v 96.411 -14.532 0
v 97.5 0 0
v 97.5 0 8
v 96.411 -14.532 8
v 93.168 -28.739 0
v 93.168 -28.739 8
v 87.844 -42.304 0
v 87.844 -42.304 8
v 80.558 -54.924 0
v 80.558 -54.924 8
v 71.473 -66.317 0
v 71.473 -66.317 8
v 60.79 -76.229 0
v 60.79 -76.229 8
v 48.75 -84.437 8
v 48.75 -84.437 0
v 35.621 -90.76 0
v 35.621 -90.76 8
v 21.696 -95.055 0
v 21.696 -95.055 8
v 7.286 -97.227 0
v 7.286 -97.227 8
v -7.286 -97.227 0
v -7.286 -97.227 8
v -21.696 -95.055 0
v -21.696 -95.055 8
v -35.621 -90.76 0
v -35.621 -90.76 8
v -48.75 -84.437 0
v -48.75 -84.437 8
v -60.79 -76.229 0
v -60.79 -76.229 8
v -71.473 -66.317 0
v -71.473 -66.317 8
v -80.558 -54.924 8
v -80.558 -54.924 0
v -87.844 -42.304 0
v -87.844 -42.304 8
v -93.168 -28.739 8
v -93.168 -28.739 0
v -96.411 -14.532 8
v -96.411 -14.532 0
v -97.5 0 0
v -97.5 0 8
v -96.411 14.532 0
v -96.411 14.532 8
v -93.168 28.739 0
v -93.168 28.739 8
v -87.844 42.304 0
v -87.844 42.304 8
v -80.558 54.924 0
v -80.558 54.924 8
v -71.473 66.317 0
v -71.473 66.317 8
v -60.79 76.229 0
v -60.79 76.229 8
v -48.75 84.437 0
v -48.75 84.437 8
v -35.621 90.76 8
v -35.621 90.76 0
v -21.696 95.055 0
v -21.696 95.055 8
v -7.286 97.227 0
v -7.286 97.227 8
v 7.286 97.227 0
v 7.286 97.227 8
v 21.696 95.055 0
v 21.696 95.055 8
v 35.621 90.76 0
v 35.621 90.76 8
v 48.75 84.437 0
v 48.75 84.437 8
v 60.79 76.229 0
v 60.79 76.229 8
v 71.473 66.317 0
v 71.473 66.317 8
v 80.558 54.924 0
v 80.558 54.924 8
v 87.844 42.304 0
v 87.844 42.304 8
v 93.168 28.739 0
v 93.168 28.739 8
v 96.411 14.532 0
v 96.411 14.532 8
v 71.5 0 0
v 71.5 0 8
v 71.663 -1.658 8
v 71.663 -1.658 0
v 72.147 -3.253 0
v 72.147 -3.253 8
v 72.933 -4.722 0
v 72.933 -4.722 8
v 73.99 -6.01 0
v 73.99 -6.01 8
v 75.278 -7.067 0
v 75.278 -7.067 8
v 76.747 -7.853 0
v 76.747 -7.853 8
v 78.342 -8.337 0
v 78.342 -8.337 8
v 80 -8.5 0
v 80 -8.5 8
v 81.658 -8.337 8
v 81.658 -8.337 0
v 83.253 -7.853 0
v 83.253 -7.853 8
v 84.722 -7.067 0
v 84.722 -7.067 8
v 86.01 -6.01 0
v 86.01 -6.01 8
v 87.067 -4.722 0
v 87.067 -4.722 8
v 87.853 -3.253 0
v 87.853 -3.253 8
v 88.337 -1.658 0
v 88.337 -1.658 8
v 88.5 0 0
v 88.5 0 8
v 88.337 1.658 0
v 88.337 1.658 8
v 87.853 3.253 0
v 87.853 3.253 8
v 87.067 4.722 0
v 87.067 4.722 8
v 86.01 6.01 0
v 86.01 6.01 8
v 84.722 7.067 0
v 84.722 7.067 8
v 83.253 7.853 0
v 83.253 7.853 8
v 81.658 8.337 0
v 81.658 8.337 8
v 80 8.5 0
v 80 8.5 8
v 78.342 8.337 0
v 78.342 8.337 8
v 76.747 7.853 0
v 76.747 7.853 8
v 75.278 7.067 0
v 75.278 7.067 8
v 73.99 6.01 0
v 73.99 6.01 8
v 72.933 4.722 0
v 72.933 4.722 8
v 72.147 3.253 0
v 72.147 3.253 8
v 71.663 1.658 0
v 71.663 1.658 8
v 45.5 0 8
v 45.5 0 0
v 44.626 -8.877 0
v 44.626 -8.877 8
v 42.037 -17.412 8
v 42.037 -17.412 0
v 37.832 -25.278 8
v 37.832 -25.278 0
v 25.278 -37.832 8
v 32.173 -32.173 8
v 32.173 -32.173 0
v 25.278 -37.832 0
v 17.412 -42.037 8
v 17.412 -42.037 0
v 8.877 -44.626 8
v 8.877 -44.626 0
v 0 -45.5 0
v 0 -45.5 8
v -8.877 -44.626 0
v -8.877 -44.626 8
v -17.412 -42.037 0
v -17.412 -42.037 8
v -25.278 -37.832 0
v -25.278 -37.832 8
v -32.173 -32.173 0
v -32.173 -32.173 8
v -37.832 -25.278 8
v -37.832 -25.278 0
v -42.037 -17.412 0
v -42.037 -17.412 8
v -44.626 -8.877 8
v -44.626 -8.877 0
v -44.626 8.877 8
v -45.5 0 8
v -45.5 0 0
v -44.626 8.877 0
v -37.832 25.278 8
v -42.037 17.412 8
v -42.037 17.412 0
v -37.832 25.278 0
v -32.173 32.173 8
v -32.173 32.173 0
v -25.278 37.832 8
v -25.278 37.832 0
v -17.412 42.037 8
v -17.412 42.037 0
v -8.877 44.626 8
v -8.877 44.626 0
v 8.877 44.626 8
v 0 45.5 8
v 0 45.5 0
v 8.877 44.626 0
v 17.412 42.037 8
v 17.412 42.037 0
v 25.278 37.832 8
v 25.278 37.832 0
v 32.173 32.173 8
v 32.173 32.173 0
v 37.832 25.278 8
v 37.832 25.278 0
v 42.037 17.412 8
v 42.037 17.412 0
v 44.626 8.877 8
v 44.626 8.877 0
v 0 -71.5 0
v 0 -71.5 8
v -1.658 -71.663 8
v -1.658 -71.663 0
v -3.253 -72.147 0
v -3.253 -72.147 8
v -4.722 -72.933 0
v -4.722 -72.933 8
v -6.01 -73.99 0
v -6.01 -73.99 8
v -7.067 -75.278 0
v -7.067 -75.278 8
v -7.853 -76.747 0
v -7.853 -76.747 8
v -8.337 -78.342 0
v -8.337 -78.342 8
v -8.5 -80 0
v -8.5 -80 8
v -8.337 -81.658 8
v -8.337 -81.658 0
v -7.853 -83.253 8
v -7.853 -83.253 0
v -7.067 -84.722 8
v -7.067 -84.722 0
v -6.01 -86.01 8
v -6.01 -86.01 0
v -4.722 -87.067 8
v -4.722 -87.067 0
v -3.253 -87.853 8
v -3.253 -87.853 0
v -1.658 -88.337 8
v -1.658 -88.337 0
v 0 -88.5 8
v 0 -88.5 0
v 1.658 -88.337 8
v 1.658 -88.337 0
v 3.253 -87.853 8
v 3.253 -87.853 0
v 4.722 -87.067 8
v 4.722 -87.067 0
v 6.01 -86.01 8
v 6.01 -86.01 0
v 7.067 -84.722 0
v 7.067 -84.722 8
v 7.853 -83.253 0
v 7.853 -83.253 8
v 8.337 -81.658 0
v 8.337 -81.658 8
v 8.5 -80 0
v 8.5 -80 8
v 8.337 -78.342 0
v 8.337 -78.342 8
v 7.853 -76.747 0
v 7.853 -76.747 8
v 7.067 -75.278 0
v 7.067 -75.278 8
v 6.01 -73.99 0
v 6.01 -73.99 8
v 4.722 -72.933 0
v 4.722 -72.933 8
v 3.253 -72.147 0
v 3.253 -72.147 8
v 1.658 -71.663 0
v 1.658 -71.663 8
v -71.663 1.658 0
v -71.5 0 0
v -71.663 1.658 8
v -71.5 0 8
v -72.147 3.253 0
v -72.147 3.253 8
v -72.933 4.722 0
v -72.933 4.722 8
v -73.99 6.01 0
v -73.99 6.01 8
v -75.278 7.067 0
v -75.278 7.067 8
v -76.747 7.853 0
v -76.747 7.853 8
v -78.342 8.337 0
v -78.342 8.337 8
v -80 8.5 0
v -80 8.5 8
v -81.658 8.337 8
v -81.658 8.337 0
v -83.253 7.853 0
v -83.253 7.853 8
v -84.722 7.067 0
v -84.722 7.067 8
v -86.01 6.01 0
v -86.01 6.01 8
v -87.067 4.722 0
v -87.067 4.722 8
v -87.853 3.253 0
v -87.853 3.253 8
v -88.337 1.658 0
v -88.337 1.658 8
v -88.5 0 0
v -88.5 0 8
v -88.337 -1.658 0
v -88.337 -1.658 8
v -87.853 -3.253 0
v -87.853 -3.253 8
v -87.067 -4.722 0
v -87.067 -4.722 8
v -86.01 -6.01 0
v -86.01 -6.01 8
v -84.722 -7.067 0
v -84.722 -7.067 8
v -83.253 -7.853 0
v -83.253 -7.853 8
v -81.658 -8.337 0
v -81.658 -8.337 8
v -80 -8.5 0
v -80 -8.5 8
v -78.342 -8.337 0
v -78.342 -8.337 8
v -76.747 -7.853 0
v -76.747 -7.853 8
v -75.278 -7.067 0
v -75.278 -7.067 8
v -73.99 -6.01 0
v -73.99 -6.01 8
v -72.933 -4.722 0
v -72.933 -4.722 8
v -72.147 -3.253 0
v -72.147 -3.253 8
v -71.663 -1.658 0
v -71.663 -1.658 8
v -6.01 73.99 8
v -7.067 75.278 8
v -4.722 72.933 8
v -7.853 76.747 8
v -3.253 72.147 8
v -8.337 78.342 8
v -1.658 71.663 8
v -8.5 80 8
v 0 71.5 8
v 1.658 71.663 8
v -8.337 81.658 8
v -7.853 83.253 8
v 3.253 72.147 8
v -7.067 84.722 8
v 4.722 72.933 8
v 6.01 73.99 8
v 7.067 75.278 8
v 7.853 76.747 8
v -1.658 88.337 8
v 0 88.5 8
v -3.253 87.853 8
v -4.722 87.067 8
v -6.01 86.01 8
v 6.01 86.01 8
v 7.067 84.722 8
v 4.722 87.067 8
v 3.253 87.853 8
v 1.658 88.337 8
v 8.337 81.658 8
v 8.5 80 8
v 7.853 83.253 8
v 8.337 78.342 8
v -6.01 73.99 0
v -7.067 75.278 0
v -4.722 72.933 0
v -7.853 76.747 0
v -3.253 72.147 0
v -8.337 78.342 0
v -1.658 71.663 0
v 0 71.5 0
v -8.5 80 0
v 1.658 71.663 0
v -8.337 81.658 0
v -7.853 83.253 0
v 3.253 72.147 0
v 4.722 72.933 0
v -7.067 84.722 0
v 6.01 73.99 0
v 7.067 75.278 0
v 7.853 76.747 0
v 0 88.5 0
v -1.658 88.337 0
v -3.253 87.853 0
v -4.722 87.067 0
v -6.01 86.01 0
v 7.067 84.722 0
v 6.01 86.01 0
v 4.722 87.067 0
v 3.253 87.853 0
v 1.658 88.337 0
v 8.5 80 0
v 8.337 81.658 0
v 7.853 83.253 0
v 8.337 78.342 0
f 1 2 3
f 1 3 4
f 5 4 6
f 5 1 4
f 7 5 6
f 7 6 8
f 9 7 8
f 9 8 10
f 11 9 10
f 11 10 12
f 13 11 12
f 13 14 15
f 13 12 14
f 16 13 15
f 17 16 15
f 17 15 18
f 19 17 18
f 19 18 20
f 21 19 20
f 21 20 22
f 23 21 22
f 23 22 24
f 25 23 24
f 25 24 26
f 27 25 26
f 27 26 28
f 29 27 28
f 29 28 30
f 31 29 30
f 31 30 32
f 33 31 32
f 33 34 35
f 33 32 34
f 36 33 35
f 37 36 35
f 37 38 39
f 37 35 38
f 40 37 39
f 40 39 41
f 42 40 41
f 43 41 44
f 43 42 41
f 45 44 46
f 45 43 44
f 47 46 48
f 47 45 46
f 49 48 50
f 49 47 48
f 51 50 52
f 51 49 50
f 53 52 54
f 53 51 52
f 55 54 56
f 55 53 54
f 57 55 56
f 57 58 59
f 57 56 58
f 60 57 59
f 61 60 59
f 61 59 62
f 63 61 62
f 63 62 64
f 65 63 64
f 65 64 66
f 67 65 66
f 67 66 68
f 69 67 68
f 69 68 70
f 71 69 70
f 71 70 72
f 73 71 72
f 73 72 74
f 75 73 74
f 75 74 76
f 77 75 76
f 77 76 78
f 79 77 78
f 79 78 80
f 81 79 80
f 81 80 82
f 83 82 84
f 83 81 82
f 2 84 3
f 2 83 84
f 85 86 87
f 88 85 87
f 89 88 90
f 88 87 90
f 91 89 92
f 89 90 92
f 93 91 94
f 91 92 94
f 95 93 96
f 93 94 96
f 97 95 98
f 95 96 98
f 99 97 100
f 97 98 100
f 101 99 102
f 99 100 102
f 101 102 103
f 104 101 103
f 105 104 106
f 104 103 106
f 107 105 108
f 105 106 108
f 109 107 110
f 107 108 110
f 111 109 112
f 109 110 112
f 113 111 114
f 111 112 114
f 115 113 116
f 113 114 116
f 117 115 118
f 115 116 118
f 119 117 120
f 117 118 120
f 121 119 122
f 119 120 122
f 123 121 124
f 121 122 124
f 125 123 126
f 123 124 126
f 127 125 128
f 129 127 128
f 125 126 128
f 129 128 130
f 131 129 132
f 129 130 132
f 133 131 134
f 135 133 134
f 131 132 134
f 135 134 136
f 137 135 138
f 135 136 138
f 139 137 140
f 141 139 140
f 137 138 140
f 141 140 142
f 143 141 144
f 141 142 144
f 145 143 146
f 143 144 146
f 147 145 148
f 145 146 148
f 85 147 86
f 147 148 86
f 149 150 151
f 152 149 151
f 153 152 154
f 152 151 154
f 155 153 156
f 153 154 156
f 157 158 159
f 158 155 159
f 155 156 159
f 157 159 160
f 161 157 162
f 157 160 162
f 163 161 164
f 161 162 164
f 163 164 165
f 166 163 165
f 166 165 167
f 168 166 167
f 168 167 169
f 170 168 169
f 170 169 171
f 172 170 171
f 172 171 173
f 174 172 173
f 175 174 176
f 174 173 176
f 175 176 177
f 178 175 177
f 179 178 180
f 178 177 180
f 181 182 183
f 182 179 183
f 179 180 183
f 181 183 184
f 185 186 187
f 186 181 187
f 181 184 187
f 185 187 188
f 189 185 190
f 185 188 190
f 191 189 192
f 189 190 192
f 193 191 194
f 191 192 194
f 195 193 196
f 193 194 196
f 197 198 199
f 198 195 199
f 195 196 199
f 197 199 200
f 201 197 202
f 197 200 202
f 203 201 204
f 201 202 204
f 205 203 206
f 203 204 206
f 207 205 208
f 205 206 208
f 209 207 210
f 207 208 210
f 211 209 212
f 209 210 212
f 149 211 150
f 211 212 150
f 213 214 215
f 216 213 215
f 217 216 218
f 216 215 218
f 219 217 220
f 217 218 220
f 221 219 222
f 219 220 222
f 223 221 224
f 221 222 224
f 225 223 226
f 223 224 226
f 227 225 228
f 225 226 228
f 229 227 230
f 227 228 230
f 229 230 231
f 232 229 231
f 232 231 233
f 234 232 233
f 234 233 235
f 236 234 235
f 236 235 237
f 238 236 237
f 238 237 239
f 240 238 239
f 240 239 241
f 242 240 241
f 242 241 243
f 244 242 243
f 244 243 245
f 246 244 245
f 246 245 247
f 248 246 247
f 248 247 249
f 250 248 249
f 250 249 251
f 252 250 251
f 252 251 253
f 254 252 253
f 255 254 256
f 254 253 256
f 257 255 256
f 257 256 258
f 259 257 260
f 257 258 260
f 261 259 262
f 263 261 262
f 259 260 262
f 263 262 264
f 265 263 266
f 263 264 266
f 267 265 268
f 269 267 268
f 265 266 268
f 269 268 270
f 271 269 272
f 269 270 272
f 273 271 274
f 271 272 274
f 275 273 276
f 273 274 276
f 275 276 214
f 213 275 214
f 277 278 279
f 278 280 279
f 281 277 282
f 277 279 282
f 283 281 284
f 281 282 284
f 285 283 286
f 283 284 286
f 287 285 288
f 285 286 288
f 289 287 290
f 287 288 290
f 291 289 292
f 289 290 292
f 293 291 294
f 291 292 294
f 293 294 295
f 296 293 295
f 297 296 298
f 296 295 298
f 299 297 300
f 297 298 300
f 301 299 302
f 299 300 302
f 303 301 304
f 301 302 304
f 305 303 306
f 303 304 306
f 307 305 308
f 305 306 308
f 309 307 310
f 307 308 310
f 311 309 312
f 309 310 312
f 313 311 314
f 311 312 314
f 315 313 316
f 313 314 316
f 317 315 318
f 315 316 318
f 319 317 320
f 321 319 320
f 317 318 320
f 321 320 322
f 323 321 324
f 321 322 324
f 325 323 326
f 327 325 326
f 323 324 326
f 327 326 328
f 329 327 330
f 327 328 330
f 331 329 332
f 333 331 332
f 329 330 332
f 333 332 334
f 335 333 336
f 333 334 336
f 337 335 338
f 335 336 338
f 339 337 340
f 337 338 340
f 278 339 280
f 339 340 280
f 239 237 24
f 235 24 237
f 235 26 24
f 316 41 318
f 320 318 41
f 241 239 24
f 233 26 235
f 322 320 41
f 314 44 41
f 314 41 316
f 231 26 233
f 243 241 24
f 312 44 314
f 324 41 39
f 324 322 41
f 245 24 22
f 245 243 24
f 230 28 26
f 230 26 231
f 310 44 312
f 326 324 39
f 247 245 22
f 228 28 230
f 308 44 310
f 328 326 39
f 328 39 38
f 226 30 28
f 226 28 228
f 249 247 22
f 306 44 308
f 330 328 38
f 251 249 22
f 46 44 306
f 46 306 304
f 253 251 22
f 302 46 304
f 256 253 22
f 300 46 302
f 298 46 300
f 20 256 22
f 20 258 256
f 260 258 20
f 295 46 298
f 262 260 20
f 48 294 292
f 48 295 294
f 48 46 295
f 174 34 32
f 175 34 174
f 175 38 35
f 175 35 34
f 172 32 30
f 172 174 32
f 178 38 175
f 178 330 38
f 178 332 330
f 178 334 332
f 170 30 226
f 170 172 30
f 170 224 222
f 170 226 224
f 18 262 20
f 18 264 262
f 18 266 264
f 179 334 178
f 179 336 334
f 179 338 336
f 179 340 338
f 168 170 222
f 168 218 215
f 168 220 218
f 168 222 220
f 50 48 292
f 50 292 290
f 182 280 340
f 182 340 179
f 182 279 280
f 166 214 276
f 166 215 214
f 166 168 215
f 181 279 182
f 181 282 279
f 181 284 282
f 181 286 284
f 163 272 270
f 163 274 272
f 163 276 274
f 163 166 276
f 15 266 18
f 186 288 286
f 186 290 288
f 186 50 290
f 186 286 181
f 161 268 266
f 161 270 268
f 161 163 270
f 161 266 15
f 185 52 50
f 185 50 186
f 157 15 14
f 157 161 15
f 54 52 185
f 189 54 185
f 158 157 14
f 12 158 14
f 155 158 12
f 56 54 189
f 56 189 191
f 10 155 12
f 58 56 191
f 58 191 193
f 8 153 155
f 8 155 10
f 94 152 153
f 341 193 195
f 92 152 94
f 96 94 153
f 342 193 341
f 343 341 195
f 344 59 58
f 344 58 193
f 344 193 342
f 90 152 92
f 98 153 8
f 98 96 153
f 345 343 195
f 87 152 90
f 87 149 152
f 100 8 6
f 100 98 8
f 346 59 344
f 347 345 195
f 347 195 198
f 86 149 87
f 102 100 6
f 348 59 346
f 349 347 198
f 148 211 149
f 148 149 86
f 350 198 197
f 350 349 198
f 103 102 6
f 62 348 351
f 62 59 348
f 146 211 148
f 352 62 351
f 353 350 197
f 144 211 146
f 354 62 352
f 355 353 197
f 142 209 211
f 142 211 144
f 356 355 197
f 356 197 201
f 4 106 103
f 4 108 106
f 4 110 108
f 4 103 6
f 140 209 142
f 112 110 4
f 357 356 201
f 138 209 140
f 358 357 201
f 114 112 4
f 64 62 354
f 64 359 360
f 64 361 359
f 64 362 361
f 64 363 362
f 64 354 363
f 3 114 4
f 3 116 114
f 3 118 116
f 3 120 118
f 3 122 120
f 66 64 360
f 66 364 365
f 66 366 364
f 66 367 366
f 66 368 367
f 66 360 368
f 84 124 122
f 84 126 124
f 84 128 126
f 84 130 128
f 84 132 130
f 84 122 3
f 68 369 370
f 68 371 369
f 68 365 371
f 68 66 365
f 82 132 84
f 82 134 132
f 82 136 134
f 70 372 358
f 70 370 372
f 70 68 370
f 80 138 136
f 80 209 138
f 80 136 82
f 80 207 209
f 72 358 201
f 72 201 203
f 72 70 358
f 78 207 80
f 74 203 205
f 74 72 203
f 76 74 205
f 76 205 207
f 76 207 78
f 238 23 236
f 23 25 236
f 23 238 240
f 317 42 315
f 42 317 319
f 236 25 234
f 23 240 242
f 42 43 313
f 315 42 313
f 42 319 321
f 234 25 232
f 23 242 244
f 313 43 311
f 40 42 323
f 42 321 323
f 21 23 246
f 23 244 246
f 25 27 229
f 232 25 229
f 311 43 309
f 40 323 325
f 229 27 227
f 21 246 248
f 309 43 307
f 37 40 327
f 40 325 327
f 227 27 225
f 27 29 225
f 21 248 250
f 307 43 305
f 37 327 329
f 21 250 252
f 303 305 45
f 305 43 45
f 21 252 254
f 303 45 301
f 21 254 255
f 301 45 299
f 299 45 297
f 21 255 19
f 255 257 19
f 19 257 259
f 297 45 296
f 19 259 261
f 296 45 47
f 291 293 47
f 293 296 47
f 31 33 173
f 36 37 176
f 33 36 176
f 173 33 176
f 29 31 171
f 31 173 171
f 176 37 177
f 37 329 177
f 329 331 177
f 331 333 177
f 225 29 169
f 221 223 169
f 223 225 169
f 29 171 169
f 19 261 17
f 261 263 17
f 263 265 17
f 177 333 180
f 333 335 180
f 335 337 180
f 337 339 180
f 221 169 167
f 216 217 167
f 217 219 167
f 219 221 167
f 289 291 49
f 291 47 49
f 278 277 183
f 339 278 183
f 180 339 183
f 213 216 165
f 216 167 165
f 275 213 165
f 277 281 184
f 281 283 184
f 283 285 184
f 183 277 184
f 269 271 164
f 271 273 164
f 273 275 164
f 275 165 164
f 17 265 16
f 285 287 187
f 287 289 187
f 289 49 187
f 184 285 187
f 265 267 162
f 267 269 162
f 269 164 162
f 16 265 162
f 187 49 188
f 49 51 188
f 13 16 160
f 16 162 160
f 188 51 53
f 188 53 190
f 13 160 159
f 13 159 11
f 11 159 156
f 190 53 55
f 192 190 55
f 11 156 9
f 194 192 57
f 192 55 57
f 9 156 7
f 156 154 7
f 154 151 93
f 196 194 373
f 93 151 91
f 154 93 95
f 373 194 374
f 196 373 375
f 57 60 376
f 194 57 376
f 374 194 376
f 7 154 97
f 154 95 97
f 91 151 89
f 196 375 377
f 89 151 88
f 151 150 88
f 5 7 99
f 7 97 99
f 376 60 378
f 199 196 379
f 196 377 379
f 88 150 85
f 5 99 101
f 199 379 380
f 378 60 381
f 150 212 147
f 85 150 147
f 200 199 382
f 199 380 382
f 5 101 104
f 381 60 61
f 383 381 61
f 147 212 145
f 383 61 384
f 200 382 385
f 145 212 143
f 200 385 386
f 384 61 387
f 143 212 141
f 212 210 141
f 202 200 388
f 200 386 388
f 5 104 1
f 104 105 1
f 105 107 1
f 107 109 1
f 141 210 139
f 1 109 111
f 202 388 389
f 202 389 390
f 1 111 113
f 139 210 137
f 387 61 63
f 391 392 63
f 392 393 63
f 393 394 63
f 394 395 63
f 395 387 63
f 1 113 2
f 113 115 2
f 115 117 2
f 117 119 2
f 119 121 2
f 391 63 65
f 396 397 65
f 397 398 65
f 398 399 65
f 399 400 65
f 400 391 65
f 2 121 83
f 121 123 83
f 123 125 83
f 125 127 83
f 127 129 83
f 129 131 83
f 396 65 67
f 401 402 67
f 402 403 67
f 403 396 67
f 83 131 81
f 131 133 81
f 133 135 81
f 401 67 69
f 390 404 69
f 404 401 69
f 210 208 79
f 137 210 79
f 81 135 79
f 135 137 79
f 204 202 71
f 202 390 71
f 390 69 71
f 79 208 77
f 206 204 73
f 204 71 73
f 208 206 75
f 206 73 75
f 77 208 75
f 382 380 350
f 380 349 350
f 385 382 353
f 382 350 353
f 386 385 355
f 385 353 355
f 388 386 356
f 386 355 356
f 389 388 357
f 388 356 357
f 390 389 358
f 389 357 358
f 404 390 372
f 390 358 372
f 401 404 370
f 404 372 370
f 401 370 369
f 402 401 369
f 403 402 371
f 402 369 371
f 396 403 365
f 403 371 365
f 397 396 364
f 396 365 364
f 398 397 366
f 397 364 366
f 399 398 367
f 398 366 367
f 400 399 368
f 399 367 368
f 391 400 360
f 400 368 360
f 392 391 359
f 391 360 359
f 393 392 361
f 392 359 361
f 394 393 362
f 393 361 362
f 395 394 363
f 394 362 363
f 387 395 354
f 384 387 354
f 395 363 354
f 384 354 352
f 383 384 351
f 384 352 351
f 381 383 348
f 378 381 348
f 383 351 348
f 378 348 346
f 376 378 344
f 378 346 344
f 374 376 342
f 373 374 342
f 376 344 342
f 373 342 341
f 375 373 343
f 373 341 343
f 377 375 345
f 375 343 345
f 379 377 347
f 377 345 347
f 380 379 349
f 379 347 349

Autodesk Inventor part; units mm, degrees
ref_plane "YZ Plane" through (0, 0, 0) normal (1, 0, 0) x (0, 1, 0)
ref_plane "XZ Plane" through (0, 0, 0) normal (0, 1, 0) x (-1, 0, 0)
ref_plane "XY Plane" through (0, 0, 0) normal (0, 0, 1) x (1, 0, 0)
sketch "Sketch2" plane through (0, 0, 0) normal (0, 0, 1) x (1, 0, 0)
  circle A0 centre (0, 0) radius 45.5
  circle A1 centre (0, 0) radius 97.5
  dimension "d25" = 91
  dimension "d27" = 195
extrude "Plate2" add sketch "Sketch2" along normal blind 8
sketch "Sketch3" plane through (0, 0, 8) normal (0, 0, 1) x (1, 0, 0)
  circle A0 centre (-80, 0) radius 8.5
  circle A1 centre (0, 0) radius 80 construction
  dimension "d28" = 160
  dimension "d15" = 17
extrude "Cut1" cut sketch "Sketch3" against normal blind 8
pattern_circular "Circular Pattern1" count 4 over 360 about axis through (0, 0, -10) along (0, 0, 1) of "Cut1"
equation "\"d17\" = Thickness"
equation "\"d14\" = Thickness"
equation "\"BendReliefWidth\" = Thickness"
equation "\"BendReliefDepth\" = 0.5 * Thickness"
equation "\"CornerReliefSize\" = 4 * Thickness"
equation "\"MinimumRemnant\" = 2 * Thickness"
equation "\"TransitionRadius\" = BendRadius"
equation "\"JacobiRadiusSize\" = BendRadius"
equation "\"GapSize\" = Thickness"
equation "\"Thickness\" = 8"
equation "\"BendRadius\" = 6"
properties part number "SLM 1633 charging blind flange" material "Steel"
